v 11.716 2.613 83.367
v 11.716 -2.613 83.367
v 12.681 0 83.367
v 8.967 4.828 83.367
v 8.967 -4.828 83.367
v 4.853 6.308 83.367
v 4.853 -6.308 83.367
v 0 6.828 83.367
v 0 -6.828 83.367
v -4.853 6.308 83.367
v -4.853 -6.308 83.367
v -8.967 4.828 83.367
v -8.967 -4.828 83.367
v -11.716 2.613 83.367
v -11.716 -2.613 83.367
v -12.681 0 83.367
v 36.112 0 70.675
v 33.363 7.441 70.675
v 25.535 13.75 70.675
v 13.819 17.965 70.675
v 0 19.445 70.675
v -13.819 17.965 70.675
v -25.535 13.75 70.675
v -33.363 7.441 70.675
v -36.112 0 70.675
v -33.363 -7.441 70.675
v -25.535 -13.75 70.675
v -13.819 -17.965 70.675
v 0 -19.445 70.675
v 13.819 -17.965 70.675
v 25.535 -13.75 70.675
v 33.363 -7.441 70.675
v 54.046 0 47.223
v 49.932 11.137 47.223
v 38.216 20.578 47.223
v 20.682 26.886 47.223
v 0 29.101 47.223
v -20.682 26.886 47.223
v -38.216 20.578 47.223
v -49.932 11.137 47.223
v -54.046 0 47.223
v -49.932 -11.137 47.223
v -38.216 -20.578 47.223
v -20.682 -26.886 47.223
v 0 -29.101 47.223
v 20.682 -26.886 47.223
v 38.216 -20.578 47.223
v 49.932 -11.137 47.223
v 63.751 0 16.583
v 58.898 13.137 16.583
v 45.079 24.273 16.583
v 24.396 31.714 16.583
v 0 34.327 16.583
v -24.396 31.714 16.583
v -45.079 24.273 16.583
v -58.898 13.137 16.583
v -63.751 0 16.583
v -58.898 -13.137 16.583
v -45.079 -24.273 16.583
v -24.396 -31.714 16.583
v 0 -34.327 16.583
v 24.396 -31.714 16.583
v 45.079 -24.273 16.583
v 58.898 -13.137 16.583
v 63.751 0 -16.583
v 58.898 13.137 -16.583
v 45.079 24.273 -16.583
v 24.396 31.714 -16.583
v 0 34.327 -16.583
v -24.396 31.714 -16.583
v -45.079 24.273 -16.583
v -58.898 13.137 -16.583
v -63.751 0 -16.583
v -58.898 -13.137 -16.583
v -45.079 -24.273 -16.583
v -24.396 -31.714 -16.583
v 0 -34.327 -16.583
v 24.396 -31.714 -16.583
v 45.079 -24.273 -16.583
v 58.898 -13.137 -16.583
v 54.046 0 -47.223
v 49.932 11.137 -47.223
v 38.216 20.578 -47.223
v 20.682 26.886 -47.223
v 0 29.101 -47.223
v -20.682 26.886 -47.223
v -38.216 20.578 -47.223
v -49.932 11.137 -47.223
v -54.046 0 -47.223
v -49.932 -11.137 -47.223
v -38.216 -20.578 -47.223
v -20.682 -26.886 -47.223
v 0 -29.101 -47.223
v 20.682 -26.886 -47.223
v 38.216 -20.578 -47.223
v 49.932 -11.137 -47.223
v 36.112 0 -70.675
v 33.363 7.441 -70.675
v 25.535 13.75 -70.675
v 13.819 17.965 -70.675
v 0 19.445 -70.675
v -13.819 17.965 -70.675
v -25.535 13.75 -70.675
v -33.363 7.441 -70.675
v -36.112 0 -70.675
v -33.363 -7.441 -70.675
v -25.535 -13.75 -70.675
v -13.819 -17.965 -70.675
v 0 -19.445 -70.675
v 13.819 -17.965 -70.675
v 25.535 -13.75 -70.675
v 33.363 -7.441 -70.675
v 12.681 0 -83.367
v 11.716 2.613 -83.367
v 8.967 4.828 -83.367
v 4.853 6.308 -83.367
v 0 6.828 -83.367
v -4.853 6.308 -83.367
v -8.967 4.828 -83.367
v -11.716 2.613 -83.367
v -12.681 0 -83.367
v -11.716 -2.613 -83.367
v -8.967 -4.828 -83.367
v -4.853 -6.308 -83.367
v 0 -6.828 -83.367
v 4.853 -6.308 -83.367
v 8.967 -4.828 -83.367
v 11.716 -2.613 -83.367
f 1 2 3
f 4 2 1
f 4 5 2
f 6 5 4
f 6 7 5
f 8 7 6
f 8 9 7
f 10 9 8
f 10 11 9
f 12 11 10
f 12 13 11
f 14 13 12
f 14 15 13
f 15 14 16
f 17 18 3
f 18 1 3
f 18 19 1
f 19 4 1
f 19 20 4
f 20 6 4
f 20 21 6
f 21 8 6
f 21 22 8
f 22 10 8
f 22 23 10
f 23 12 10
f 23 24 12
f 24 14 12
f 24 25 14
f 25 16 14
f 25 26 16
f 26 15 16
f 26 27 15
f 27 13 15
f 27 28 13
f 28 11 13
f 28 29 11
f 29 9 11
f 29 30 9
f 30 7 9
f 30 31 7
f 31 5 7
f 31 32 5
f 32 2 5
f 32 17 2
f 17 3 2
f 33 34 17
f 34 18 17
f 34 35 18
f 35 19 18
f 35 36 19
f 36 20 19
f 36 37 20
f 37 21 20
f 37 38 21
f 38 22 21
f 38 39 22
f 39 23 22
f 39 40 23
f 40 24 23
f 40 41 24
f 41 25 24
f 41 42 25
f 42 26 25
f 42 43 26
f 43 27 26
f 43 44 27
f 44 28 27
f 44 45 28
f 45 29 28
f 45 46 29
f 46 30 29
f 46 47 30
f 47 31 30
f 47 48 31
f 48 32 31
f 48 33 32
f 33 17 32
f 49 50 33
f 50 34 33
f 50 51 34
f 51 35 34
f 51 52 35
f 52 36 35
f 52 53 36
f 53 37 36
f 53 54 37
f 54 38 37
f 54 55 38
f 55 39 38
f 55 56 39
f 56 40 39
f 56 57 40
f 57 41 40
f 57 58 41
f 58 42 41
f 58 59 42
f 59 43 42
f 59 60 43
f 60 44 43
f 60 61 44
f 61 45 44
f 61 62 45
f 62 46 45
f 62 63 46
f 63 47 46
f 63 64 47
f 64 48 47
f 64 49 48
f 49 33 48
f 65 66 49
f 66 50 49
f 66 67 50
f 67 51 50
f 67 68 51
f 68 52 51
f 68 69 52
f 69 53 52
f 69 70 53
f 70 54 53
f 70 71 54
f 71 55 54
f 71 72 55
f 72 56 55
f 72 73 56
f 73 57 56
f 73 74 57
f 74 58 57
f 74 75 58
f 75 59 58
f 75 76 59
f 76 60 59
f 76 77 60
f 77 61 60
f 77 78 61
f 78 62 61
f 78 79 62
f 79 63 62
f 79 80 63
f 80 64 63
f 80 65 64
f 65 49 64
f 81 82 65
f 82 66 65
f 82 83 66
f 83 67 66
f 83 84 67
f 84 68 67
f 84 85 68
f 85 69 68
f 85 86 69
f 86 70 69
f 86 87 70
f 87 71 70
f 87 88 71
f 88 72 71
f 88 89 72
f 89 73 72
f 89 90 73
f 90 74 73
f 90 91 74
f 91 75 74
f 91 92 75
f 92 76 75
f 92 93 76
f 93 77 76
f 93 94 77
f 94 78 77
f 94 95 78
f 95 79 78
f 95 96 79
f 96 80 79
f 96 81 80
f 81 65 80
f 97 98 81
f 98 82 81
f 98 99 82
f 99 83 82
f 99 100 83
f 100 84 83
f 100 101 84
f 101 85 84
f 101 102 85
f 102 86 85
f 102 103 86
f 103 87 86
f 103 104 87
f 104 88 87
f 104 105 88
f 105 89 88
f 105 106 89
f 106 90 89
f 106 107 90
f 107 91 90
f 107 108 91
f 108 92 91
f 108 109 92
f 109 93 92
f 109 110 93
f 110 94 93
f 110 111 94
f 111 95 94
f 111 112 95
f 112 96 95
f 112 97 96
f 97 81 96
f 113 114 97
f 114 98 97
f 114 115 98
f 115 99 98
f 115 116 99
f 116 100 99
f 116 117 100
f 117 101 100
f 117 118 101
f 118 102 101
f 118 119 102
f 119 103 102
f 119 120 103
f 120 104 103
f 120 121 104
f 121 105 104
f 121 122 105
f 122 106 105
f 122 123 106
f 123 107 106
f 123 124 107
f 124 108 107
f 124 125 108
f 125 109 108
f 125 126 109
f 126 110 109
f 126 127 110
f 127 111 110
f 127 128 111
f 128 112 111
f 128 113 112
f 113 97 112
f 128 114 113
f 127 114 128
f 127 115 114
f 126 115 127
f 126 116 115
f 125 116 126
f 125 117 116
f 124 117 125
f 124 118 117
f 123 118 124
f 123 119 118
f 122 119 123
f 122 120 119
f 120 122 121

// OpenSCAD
// Generated by SolidPython 1.0.1 on 2020-07-29 00:46:50


scale(v = [13, 7, 17]) {
	sphere(r = 5);
}
/***********************************************
*********      SolidPython code:      **********
************************************************
 
# import packages: SolidPython
from solid import *
from solid.utils import *
from itertools import chain, combinations, permutations


class Resize:

    def __init__(self, scad_file):
        self.scad_file = scad_file
        #self.scad_file = import_scad(scad_file)
        # cone/cylinder param:
        self.r1 = 0
        self.r2 = 0
        self.h = 0
        # rectangular prism param:
        self.w = 0
        self.l = 0
        # ellipse param:
        self.r = 0

    # import OpenScad code (file name corresponds to shape)


    # classify shape + parameters
    def assign(self, param1, param2, param3):
        if self.scad_file == 'cone.scad':
            self.r1 = param1
            self.r2 = param2
            self.h = param3
        elif self.scad_file == 'cylinder.scad':
            self.r1 = param1
            self.r2 = param2
            self.h = param3
        elif self.scad_file == 'rectangularPrism.scad':
            self.h = param1
            self.l = param2
            self.w = param3
        else:
            self.r = param1
            self.h = param2

    # resize parameters
    def iterate(self):
        x = range(3, 20, 2)
        i = 1
        if self.scad_file == 'cone.scad':
            tempList = list(permutations(x, 2))
            for temp in tempList:
                param1 = temp[0]
                param2 = temp[1]
                filepath = 'produced_scad_files/' + 'cone' + str(param1) + '_' + str(param2) + '_' + '.scad'
                scad_render_to_file(cylinder(h=param1, r1=param2, r2=0), filepath)

        elif self.scad_file == 'cylinder.scad':
            tempList = list(permutations(x, 3))
            for temp in tempList:
                param1 = temp[0]
                param2 = temp[1]
                filepath = 'produced_scad_files/' + 'cylinder' + str(param1) + '_' + str(param2) + '_' + '.scad'
                scad_render_to_file(cylinder(h=param1, r1=param2, r2=param2), filepath)

        elif self.scad_file == 'rectangularPrism.scad':
            tempList = list(permutations(x, 3))
            for temp in tempList:
                param1 = temp[0]
                param2 = temp[1]
                param3 = temp[2]
                filepath = 'produced_scad_files/' + 'rectangularPrism' + str(param1) + '_' + str(param2) + '_' + str(
                    param3) + '.scad'
                scad_render_to_file(cube(size=(param1, param2, param3)), filepath)

        elif self.scad_file == 'ellipse.scad':
            tempList = list(permutations(x, 4))
            for temp in tempList:
                param1 = temp[0]
                param2 = temp[1]
                param3 = temp[2]
                param4 = temp[3]
                filepath = 'produced_scad_files/' + 'ellipse' + str(param1) + '_' + str(param2) + '_' + str(param3) + '_' + str(param4) + '.scad'
                scad_render_to_file(scale([param1, param2, param3])(sphere(r=param4)), filepath)

    def render_to_scadfile(self):
        scad_render_to_file(scad, 'example.scad') 
 
************************************************/
